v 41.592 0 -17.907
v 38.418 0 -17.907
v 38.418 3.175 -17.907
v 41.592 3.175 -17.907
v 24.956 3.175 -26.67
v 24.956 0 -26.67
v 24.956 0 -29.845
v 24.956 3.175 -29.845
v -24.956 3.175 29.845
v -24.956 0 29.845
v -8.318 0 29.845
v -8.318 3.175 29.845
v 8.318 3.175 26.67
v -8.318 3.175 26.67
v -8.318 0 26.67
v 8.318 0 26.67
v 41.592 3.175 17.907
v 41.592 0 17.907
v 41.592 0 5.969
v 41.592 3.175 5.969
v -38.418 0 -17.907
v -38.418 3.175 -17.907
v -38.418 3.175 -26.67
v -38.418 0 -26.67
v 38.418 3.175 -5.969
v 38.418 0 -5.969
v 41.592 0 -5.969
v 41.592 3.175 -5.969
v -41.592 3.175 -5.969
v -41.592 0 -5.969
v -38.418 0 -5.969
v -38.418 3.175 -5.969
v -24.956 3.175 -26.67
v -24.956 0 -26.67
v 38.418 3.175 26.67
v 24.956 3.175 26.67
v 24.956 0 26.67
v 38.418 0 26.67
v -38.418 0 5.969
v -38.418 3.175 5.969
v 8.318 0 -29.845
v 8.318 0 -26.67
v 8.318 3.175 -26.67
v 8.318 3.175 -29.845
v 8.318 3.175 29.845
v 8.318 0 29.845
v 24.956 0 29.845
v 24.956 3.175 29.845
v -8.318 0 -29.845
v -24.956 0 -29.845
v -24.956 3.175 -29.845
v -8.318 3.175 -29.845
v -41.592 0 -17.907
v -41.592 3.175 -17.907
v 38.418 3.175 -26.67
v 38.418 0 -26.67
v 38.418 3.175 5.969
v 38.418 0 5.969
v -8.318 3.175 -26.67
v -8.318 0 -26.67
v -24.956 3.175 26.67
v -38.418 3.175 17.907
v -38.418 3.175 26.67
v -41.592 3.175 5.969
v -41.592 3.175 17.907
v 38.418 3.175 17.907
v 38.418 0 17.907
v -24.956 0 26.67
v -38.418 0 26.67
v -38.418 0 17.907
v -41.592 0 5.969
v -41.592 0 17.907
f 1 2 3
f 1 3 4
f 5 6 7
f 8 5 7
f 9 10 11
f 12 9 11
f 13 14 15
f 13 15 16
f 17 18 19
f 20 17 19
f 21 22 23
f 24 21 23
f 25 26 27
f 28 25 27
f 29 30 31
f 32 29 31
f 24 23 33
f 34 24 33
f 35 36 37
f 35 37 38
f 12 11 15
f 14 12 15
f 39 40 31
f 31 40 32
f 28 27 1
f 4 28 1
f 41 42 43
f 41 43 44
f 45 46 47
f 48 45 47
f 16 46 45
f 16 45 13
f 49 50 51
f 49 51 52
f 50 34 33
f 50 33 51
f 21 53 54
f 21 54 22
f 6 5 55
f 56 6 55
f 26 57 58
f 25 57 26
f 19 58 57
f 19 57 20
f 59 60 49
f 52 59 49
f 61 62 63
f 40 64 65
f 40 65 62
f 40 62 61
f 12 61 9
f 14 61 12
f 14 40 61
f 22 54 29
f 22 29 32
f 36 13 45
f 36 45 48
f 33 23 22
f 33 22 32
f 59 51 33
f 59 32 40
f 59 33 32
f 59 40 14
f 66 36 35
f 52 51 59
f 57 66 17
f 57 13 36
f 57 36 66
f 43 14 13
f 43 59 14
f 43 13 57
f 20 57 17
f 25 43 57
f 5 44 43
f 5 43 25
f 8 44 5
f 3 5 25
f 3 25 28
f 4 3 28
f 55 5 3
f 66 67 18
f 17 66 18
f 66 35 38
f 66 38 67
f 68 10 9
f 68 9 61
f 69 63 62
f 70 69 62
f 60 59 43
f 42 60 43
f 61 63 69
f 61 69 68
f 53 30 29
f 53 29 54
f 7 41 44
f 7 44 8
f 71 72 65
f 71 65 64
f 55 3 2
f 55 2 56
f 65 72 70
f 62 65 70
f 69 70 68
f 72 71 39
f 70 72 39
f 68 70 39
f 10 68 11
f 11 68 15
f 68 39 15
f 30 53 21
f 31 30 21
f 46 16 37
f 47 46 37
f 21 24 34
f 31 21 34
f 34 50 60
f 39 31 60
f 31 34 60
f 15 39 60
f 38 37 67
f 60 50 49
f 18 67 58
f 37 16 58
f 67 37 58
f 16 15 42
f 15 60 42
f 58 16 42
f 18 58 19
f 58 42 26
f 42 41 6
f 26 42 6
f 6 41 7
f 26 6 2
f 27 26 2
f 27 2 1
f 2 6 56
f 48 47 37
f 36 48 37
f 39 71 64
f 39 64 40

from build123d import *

# Parameters (mm, degrees)
SKETCH1_W           = 83.185
SKETCH1_H           = 59.69
BOSS_EXTRUDE1_DEPTH = 3.175
SKETCH2_W           = 16.637
SKETCH2_H           = 3.175
CUT_EXTRUDE1_DEPTH  = 3.175
LPATTERN1_COUNT     = 3
LPATTERN1_PITCH     = 33.274
SKETCH3_W           = 3.175
SKETCH3_H           = 11.938
CUT_EXTRUDE2_DEPTH  = 3.175
LPATTERN4_COUNT     = 3
LPATTERN4_PITCH     = 23.876


with BuildPart() as part:
    # Sketch1 → Boss-Extrude1 (new body)
    with BuildSketch(Plane(origin=(0, 0, 0), x_dir=(1, 0, 0), z_dir=(0, 1, 0))):
        Rectangle(SKETCH1_W, SKETCH1_H)
    extrude(amount=BOSS_EXTRUDE1_DEPTH)

    # Sketch2 → Cut-Extrude1 (cut)
    with BuildSketch(Plane(origin=(0, 3.175, 0), x_dir=(1, 0, 0), z_dir=(0, 1, 0))):
        with Locations((-33.274, 28.2575)):
            Rectangle(SKETCH2_W, SKETCH2_H)
        with Locations((-33.274, -28.2575)):
            Rectangle(SKETCH2_W, SKETCH2_H)
    cut_extrude1 = extrude(amount=-CUT_EXTRUDE1_DEPTH, mode=Mode.SUBTRACT)

    # LPattern1: Cut-Extrude1 ×3
    with Locations(*[(i * LPATTERN1_PITCH, 0, 0) for i in range(1, LPATTERN1_COUNT)]):
        add(cut_extrude1, mode=Mode.SUBTRACT)

    # Sketch3 → Cut-Extrude2 (cut)
    with BuildSketch(Plane(origin=(0, 3.175, 0), x_dir=(1, 0, 0), z_dir=(0, 1, 0))):
        with Locations((-40.005, 23.876)):
            Rectangle(SKETCH3_W, SKETCH3_H)
        with Locations((40.005, 23.876)):
            Rectangle(SKETCH3_W, SKETCH3_H)
    cut_extrude2 = extrude(amount=-CUT_EXTRUDE2_DEPTH, mode=Mode.SUBTRACT)

    # LPattern4: Cut-Extrude2 ×3
    with Locations(*[(0, 0, i * LPATTERN4_PITCH) for i in range(1, LPATTERN4_COUNT)]):
        add(cut_extrude2, mode=Mode.SUBTRACT)


solid = part.part
